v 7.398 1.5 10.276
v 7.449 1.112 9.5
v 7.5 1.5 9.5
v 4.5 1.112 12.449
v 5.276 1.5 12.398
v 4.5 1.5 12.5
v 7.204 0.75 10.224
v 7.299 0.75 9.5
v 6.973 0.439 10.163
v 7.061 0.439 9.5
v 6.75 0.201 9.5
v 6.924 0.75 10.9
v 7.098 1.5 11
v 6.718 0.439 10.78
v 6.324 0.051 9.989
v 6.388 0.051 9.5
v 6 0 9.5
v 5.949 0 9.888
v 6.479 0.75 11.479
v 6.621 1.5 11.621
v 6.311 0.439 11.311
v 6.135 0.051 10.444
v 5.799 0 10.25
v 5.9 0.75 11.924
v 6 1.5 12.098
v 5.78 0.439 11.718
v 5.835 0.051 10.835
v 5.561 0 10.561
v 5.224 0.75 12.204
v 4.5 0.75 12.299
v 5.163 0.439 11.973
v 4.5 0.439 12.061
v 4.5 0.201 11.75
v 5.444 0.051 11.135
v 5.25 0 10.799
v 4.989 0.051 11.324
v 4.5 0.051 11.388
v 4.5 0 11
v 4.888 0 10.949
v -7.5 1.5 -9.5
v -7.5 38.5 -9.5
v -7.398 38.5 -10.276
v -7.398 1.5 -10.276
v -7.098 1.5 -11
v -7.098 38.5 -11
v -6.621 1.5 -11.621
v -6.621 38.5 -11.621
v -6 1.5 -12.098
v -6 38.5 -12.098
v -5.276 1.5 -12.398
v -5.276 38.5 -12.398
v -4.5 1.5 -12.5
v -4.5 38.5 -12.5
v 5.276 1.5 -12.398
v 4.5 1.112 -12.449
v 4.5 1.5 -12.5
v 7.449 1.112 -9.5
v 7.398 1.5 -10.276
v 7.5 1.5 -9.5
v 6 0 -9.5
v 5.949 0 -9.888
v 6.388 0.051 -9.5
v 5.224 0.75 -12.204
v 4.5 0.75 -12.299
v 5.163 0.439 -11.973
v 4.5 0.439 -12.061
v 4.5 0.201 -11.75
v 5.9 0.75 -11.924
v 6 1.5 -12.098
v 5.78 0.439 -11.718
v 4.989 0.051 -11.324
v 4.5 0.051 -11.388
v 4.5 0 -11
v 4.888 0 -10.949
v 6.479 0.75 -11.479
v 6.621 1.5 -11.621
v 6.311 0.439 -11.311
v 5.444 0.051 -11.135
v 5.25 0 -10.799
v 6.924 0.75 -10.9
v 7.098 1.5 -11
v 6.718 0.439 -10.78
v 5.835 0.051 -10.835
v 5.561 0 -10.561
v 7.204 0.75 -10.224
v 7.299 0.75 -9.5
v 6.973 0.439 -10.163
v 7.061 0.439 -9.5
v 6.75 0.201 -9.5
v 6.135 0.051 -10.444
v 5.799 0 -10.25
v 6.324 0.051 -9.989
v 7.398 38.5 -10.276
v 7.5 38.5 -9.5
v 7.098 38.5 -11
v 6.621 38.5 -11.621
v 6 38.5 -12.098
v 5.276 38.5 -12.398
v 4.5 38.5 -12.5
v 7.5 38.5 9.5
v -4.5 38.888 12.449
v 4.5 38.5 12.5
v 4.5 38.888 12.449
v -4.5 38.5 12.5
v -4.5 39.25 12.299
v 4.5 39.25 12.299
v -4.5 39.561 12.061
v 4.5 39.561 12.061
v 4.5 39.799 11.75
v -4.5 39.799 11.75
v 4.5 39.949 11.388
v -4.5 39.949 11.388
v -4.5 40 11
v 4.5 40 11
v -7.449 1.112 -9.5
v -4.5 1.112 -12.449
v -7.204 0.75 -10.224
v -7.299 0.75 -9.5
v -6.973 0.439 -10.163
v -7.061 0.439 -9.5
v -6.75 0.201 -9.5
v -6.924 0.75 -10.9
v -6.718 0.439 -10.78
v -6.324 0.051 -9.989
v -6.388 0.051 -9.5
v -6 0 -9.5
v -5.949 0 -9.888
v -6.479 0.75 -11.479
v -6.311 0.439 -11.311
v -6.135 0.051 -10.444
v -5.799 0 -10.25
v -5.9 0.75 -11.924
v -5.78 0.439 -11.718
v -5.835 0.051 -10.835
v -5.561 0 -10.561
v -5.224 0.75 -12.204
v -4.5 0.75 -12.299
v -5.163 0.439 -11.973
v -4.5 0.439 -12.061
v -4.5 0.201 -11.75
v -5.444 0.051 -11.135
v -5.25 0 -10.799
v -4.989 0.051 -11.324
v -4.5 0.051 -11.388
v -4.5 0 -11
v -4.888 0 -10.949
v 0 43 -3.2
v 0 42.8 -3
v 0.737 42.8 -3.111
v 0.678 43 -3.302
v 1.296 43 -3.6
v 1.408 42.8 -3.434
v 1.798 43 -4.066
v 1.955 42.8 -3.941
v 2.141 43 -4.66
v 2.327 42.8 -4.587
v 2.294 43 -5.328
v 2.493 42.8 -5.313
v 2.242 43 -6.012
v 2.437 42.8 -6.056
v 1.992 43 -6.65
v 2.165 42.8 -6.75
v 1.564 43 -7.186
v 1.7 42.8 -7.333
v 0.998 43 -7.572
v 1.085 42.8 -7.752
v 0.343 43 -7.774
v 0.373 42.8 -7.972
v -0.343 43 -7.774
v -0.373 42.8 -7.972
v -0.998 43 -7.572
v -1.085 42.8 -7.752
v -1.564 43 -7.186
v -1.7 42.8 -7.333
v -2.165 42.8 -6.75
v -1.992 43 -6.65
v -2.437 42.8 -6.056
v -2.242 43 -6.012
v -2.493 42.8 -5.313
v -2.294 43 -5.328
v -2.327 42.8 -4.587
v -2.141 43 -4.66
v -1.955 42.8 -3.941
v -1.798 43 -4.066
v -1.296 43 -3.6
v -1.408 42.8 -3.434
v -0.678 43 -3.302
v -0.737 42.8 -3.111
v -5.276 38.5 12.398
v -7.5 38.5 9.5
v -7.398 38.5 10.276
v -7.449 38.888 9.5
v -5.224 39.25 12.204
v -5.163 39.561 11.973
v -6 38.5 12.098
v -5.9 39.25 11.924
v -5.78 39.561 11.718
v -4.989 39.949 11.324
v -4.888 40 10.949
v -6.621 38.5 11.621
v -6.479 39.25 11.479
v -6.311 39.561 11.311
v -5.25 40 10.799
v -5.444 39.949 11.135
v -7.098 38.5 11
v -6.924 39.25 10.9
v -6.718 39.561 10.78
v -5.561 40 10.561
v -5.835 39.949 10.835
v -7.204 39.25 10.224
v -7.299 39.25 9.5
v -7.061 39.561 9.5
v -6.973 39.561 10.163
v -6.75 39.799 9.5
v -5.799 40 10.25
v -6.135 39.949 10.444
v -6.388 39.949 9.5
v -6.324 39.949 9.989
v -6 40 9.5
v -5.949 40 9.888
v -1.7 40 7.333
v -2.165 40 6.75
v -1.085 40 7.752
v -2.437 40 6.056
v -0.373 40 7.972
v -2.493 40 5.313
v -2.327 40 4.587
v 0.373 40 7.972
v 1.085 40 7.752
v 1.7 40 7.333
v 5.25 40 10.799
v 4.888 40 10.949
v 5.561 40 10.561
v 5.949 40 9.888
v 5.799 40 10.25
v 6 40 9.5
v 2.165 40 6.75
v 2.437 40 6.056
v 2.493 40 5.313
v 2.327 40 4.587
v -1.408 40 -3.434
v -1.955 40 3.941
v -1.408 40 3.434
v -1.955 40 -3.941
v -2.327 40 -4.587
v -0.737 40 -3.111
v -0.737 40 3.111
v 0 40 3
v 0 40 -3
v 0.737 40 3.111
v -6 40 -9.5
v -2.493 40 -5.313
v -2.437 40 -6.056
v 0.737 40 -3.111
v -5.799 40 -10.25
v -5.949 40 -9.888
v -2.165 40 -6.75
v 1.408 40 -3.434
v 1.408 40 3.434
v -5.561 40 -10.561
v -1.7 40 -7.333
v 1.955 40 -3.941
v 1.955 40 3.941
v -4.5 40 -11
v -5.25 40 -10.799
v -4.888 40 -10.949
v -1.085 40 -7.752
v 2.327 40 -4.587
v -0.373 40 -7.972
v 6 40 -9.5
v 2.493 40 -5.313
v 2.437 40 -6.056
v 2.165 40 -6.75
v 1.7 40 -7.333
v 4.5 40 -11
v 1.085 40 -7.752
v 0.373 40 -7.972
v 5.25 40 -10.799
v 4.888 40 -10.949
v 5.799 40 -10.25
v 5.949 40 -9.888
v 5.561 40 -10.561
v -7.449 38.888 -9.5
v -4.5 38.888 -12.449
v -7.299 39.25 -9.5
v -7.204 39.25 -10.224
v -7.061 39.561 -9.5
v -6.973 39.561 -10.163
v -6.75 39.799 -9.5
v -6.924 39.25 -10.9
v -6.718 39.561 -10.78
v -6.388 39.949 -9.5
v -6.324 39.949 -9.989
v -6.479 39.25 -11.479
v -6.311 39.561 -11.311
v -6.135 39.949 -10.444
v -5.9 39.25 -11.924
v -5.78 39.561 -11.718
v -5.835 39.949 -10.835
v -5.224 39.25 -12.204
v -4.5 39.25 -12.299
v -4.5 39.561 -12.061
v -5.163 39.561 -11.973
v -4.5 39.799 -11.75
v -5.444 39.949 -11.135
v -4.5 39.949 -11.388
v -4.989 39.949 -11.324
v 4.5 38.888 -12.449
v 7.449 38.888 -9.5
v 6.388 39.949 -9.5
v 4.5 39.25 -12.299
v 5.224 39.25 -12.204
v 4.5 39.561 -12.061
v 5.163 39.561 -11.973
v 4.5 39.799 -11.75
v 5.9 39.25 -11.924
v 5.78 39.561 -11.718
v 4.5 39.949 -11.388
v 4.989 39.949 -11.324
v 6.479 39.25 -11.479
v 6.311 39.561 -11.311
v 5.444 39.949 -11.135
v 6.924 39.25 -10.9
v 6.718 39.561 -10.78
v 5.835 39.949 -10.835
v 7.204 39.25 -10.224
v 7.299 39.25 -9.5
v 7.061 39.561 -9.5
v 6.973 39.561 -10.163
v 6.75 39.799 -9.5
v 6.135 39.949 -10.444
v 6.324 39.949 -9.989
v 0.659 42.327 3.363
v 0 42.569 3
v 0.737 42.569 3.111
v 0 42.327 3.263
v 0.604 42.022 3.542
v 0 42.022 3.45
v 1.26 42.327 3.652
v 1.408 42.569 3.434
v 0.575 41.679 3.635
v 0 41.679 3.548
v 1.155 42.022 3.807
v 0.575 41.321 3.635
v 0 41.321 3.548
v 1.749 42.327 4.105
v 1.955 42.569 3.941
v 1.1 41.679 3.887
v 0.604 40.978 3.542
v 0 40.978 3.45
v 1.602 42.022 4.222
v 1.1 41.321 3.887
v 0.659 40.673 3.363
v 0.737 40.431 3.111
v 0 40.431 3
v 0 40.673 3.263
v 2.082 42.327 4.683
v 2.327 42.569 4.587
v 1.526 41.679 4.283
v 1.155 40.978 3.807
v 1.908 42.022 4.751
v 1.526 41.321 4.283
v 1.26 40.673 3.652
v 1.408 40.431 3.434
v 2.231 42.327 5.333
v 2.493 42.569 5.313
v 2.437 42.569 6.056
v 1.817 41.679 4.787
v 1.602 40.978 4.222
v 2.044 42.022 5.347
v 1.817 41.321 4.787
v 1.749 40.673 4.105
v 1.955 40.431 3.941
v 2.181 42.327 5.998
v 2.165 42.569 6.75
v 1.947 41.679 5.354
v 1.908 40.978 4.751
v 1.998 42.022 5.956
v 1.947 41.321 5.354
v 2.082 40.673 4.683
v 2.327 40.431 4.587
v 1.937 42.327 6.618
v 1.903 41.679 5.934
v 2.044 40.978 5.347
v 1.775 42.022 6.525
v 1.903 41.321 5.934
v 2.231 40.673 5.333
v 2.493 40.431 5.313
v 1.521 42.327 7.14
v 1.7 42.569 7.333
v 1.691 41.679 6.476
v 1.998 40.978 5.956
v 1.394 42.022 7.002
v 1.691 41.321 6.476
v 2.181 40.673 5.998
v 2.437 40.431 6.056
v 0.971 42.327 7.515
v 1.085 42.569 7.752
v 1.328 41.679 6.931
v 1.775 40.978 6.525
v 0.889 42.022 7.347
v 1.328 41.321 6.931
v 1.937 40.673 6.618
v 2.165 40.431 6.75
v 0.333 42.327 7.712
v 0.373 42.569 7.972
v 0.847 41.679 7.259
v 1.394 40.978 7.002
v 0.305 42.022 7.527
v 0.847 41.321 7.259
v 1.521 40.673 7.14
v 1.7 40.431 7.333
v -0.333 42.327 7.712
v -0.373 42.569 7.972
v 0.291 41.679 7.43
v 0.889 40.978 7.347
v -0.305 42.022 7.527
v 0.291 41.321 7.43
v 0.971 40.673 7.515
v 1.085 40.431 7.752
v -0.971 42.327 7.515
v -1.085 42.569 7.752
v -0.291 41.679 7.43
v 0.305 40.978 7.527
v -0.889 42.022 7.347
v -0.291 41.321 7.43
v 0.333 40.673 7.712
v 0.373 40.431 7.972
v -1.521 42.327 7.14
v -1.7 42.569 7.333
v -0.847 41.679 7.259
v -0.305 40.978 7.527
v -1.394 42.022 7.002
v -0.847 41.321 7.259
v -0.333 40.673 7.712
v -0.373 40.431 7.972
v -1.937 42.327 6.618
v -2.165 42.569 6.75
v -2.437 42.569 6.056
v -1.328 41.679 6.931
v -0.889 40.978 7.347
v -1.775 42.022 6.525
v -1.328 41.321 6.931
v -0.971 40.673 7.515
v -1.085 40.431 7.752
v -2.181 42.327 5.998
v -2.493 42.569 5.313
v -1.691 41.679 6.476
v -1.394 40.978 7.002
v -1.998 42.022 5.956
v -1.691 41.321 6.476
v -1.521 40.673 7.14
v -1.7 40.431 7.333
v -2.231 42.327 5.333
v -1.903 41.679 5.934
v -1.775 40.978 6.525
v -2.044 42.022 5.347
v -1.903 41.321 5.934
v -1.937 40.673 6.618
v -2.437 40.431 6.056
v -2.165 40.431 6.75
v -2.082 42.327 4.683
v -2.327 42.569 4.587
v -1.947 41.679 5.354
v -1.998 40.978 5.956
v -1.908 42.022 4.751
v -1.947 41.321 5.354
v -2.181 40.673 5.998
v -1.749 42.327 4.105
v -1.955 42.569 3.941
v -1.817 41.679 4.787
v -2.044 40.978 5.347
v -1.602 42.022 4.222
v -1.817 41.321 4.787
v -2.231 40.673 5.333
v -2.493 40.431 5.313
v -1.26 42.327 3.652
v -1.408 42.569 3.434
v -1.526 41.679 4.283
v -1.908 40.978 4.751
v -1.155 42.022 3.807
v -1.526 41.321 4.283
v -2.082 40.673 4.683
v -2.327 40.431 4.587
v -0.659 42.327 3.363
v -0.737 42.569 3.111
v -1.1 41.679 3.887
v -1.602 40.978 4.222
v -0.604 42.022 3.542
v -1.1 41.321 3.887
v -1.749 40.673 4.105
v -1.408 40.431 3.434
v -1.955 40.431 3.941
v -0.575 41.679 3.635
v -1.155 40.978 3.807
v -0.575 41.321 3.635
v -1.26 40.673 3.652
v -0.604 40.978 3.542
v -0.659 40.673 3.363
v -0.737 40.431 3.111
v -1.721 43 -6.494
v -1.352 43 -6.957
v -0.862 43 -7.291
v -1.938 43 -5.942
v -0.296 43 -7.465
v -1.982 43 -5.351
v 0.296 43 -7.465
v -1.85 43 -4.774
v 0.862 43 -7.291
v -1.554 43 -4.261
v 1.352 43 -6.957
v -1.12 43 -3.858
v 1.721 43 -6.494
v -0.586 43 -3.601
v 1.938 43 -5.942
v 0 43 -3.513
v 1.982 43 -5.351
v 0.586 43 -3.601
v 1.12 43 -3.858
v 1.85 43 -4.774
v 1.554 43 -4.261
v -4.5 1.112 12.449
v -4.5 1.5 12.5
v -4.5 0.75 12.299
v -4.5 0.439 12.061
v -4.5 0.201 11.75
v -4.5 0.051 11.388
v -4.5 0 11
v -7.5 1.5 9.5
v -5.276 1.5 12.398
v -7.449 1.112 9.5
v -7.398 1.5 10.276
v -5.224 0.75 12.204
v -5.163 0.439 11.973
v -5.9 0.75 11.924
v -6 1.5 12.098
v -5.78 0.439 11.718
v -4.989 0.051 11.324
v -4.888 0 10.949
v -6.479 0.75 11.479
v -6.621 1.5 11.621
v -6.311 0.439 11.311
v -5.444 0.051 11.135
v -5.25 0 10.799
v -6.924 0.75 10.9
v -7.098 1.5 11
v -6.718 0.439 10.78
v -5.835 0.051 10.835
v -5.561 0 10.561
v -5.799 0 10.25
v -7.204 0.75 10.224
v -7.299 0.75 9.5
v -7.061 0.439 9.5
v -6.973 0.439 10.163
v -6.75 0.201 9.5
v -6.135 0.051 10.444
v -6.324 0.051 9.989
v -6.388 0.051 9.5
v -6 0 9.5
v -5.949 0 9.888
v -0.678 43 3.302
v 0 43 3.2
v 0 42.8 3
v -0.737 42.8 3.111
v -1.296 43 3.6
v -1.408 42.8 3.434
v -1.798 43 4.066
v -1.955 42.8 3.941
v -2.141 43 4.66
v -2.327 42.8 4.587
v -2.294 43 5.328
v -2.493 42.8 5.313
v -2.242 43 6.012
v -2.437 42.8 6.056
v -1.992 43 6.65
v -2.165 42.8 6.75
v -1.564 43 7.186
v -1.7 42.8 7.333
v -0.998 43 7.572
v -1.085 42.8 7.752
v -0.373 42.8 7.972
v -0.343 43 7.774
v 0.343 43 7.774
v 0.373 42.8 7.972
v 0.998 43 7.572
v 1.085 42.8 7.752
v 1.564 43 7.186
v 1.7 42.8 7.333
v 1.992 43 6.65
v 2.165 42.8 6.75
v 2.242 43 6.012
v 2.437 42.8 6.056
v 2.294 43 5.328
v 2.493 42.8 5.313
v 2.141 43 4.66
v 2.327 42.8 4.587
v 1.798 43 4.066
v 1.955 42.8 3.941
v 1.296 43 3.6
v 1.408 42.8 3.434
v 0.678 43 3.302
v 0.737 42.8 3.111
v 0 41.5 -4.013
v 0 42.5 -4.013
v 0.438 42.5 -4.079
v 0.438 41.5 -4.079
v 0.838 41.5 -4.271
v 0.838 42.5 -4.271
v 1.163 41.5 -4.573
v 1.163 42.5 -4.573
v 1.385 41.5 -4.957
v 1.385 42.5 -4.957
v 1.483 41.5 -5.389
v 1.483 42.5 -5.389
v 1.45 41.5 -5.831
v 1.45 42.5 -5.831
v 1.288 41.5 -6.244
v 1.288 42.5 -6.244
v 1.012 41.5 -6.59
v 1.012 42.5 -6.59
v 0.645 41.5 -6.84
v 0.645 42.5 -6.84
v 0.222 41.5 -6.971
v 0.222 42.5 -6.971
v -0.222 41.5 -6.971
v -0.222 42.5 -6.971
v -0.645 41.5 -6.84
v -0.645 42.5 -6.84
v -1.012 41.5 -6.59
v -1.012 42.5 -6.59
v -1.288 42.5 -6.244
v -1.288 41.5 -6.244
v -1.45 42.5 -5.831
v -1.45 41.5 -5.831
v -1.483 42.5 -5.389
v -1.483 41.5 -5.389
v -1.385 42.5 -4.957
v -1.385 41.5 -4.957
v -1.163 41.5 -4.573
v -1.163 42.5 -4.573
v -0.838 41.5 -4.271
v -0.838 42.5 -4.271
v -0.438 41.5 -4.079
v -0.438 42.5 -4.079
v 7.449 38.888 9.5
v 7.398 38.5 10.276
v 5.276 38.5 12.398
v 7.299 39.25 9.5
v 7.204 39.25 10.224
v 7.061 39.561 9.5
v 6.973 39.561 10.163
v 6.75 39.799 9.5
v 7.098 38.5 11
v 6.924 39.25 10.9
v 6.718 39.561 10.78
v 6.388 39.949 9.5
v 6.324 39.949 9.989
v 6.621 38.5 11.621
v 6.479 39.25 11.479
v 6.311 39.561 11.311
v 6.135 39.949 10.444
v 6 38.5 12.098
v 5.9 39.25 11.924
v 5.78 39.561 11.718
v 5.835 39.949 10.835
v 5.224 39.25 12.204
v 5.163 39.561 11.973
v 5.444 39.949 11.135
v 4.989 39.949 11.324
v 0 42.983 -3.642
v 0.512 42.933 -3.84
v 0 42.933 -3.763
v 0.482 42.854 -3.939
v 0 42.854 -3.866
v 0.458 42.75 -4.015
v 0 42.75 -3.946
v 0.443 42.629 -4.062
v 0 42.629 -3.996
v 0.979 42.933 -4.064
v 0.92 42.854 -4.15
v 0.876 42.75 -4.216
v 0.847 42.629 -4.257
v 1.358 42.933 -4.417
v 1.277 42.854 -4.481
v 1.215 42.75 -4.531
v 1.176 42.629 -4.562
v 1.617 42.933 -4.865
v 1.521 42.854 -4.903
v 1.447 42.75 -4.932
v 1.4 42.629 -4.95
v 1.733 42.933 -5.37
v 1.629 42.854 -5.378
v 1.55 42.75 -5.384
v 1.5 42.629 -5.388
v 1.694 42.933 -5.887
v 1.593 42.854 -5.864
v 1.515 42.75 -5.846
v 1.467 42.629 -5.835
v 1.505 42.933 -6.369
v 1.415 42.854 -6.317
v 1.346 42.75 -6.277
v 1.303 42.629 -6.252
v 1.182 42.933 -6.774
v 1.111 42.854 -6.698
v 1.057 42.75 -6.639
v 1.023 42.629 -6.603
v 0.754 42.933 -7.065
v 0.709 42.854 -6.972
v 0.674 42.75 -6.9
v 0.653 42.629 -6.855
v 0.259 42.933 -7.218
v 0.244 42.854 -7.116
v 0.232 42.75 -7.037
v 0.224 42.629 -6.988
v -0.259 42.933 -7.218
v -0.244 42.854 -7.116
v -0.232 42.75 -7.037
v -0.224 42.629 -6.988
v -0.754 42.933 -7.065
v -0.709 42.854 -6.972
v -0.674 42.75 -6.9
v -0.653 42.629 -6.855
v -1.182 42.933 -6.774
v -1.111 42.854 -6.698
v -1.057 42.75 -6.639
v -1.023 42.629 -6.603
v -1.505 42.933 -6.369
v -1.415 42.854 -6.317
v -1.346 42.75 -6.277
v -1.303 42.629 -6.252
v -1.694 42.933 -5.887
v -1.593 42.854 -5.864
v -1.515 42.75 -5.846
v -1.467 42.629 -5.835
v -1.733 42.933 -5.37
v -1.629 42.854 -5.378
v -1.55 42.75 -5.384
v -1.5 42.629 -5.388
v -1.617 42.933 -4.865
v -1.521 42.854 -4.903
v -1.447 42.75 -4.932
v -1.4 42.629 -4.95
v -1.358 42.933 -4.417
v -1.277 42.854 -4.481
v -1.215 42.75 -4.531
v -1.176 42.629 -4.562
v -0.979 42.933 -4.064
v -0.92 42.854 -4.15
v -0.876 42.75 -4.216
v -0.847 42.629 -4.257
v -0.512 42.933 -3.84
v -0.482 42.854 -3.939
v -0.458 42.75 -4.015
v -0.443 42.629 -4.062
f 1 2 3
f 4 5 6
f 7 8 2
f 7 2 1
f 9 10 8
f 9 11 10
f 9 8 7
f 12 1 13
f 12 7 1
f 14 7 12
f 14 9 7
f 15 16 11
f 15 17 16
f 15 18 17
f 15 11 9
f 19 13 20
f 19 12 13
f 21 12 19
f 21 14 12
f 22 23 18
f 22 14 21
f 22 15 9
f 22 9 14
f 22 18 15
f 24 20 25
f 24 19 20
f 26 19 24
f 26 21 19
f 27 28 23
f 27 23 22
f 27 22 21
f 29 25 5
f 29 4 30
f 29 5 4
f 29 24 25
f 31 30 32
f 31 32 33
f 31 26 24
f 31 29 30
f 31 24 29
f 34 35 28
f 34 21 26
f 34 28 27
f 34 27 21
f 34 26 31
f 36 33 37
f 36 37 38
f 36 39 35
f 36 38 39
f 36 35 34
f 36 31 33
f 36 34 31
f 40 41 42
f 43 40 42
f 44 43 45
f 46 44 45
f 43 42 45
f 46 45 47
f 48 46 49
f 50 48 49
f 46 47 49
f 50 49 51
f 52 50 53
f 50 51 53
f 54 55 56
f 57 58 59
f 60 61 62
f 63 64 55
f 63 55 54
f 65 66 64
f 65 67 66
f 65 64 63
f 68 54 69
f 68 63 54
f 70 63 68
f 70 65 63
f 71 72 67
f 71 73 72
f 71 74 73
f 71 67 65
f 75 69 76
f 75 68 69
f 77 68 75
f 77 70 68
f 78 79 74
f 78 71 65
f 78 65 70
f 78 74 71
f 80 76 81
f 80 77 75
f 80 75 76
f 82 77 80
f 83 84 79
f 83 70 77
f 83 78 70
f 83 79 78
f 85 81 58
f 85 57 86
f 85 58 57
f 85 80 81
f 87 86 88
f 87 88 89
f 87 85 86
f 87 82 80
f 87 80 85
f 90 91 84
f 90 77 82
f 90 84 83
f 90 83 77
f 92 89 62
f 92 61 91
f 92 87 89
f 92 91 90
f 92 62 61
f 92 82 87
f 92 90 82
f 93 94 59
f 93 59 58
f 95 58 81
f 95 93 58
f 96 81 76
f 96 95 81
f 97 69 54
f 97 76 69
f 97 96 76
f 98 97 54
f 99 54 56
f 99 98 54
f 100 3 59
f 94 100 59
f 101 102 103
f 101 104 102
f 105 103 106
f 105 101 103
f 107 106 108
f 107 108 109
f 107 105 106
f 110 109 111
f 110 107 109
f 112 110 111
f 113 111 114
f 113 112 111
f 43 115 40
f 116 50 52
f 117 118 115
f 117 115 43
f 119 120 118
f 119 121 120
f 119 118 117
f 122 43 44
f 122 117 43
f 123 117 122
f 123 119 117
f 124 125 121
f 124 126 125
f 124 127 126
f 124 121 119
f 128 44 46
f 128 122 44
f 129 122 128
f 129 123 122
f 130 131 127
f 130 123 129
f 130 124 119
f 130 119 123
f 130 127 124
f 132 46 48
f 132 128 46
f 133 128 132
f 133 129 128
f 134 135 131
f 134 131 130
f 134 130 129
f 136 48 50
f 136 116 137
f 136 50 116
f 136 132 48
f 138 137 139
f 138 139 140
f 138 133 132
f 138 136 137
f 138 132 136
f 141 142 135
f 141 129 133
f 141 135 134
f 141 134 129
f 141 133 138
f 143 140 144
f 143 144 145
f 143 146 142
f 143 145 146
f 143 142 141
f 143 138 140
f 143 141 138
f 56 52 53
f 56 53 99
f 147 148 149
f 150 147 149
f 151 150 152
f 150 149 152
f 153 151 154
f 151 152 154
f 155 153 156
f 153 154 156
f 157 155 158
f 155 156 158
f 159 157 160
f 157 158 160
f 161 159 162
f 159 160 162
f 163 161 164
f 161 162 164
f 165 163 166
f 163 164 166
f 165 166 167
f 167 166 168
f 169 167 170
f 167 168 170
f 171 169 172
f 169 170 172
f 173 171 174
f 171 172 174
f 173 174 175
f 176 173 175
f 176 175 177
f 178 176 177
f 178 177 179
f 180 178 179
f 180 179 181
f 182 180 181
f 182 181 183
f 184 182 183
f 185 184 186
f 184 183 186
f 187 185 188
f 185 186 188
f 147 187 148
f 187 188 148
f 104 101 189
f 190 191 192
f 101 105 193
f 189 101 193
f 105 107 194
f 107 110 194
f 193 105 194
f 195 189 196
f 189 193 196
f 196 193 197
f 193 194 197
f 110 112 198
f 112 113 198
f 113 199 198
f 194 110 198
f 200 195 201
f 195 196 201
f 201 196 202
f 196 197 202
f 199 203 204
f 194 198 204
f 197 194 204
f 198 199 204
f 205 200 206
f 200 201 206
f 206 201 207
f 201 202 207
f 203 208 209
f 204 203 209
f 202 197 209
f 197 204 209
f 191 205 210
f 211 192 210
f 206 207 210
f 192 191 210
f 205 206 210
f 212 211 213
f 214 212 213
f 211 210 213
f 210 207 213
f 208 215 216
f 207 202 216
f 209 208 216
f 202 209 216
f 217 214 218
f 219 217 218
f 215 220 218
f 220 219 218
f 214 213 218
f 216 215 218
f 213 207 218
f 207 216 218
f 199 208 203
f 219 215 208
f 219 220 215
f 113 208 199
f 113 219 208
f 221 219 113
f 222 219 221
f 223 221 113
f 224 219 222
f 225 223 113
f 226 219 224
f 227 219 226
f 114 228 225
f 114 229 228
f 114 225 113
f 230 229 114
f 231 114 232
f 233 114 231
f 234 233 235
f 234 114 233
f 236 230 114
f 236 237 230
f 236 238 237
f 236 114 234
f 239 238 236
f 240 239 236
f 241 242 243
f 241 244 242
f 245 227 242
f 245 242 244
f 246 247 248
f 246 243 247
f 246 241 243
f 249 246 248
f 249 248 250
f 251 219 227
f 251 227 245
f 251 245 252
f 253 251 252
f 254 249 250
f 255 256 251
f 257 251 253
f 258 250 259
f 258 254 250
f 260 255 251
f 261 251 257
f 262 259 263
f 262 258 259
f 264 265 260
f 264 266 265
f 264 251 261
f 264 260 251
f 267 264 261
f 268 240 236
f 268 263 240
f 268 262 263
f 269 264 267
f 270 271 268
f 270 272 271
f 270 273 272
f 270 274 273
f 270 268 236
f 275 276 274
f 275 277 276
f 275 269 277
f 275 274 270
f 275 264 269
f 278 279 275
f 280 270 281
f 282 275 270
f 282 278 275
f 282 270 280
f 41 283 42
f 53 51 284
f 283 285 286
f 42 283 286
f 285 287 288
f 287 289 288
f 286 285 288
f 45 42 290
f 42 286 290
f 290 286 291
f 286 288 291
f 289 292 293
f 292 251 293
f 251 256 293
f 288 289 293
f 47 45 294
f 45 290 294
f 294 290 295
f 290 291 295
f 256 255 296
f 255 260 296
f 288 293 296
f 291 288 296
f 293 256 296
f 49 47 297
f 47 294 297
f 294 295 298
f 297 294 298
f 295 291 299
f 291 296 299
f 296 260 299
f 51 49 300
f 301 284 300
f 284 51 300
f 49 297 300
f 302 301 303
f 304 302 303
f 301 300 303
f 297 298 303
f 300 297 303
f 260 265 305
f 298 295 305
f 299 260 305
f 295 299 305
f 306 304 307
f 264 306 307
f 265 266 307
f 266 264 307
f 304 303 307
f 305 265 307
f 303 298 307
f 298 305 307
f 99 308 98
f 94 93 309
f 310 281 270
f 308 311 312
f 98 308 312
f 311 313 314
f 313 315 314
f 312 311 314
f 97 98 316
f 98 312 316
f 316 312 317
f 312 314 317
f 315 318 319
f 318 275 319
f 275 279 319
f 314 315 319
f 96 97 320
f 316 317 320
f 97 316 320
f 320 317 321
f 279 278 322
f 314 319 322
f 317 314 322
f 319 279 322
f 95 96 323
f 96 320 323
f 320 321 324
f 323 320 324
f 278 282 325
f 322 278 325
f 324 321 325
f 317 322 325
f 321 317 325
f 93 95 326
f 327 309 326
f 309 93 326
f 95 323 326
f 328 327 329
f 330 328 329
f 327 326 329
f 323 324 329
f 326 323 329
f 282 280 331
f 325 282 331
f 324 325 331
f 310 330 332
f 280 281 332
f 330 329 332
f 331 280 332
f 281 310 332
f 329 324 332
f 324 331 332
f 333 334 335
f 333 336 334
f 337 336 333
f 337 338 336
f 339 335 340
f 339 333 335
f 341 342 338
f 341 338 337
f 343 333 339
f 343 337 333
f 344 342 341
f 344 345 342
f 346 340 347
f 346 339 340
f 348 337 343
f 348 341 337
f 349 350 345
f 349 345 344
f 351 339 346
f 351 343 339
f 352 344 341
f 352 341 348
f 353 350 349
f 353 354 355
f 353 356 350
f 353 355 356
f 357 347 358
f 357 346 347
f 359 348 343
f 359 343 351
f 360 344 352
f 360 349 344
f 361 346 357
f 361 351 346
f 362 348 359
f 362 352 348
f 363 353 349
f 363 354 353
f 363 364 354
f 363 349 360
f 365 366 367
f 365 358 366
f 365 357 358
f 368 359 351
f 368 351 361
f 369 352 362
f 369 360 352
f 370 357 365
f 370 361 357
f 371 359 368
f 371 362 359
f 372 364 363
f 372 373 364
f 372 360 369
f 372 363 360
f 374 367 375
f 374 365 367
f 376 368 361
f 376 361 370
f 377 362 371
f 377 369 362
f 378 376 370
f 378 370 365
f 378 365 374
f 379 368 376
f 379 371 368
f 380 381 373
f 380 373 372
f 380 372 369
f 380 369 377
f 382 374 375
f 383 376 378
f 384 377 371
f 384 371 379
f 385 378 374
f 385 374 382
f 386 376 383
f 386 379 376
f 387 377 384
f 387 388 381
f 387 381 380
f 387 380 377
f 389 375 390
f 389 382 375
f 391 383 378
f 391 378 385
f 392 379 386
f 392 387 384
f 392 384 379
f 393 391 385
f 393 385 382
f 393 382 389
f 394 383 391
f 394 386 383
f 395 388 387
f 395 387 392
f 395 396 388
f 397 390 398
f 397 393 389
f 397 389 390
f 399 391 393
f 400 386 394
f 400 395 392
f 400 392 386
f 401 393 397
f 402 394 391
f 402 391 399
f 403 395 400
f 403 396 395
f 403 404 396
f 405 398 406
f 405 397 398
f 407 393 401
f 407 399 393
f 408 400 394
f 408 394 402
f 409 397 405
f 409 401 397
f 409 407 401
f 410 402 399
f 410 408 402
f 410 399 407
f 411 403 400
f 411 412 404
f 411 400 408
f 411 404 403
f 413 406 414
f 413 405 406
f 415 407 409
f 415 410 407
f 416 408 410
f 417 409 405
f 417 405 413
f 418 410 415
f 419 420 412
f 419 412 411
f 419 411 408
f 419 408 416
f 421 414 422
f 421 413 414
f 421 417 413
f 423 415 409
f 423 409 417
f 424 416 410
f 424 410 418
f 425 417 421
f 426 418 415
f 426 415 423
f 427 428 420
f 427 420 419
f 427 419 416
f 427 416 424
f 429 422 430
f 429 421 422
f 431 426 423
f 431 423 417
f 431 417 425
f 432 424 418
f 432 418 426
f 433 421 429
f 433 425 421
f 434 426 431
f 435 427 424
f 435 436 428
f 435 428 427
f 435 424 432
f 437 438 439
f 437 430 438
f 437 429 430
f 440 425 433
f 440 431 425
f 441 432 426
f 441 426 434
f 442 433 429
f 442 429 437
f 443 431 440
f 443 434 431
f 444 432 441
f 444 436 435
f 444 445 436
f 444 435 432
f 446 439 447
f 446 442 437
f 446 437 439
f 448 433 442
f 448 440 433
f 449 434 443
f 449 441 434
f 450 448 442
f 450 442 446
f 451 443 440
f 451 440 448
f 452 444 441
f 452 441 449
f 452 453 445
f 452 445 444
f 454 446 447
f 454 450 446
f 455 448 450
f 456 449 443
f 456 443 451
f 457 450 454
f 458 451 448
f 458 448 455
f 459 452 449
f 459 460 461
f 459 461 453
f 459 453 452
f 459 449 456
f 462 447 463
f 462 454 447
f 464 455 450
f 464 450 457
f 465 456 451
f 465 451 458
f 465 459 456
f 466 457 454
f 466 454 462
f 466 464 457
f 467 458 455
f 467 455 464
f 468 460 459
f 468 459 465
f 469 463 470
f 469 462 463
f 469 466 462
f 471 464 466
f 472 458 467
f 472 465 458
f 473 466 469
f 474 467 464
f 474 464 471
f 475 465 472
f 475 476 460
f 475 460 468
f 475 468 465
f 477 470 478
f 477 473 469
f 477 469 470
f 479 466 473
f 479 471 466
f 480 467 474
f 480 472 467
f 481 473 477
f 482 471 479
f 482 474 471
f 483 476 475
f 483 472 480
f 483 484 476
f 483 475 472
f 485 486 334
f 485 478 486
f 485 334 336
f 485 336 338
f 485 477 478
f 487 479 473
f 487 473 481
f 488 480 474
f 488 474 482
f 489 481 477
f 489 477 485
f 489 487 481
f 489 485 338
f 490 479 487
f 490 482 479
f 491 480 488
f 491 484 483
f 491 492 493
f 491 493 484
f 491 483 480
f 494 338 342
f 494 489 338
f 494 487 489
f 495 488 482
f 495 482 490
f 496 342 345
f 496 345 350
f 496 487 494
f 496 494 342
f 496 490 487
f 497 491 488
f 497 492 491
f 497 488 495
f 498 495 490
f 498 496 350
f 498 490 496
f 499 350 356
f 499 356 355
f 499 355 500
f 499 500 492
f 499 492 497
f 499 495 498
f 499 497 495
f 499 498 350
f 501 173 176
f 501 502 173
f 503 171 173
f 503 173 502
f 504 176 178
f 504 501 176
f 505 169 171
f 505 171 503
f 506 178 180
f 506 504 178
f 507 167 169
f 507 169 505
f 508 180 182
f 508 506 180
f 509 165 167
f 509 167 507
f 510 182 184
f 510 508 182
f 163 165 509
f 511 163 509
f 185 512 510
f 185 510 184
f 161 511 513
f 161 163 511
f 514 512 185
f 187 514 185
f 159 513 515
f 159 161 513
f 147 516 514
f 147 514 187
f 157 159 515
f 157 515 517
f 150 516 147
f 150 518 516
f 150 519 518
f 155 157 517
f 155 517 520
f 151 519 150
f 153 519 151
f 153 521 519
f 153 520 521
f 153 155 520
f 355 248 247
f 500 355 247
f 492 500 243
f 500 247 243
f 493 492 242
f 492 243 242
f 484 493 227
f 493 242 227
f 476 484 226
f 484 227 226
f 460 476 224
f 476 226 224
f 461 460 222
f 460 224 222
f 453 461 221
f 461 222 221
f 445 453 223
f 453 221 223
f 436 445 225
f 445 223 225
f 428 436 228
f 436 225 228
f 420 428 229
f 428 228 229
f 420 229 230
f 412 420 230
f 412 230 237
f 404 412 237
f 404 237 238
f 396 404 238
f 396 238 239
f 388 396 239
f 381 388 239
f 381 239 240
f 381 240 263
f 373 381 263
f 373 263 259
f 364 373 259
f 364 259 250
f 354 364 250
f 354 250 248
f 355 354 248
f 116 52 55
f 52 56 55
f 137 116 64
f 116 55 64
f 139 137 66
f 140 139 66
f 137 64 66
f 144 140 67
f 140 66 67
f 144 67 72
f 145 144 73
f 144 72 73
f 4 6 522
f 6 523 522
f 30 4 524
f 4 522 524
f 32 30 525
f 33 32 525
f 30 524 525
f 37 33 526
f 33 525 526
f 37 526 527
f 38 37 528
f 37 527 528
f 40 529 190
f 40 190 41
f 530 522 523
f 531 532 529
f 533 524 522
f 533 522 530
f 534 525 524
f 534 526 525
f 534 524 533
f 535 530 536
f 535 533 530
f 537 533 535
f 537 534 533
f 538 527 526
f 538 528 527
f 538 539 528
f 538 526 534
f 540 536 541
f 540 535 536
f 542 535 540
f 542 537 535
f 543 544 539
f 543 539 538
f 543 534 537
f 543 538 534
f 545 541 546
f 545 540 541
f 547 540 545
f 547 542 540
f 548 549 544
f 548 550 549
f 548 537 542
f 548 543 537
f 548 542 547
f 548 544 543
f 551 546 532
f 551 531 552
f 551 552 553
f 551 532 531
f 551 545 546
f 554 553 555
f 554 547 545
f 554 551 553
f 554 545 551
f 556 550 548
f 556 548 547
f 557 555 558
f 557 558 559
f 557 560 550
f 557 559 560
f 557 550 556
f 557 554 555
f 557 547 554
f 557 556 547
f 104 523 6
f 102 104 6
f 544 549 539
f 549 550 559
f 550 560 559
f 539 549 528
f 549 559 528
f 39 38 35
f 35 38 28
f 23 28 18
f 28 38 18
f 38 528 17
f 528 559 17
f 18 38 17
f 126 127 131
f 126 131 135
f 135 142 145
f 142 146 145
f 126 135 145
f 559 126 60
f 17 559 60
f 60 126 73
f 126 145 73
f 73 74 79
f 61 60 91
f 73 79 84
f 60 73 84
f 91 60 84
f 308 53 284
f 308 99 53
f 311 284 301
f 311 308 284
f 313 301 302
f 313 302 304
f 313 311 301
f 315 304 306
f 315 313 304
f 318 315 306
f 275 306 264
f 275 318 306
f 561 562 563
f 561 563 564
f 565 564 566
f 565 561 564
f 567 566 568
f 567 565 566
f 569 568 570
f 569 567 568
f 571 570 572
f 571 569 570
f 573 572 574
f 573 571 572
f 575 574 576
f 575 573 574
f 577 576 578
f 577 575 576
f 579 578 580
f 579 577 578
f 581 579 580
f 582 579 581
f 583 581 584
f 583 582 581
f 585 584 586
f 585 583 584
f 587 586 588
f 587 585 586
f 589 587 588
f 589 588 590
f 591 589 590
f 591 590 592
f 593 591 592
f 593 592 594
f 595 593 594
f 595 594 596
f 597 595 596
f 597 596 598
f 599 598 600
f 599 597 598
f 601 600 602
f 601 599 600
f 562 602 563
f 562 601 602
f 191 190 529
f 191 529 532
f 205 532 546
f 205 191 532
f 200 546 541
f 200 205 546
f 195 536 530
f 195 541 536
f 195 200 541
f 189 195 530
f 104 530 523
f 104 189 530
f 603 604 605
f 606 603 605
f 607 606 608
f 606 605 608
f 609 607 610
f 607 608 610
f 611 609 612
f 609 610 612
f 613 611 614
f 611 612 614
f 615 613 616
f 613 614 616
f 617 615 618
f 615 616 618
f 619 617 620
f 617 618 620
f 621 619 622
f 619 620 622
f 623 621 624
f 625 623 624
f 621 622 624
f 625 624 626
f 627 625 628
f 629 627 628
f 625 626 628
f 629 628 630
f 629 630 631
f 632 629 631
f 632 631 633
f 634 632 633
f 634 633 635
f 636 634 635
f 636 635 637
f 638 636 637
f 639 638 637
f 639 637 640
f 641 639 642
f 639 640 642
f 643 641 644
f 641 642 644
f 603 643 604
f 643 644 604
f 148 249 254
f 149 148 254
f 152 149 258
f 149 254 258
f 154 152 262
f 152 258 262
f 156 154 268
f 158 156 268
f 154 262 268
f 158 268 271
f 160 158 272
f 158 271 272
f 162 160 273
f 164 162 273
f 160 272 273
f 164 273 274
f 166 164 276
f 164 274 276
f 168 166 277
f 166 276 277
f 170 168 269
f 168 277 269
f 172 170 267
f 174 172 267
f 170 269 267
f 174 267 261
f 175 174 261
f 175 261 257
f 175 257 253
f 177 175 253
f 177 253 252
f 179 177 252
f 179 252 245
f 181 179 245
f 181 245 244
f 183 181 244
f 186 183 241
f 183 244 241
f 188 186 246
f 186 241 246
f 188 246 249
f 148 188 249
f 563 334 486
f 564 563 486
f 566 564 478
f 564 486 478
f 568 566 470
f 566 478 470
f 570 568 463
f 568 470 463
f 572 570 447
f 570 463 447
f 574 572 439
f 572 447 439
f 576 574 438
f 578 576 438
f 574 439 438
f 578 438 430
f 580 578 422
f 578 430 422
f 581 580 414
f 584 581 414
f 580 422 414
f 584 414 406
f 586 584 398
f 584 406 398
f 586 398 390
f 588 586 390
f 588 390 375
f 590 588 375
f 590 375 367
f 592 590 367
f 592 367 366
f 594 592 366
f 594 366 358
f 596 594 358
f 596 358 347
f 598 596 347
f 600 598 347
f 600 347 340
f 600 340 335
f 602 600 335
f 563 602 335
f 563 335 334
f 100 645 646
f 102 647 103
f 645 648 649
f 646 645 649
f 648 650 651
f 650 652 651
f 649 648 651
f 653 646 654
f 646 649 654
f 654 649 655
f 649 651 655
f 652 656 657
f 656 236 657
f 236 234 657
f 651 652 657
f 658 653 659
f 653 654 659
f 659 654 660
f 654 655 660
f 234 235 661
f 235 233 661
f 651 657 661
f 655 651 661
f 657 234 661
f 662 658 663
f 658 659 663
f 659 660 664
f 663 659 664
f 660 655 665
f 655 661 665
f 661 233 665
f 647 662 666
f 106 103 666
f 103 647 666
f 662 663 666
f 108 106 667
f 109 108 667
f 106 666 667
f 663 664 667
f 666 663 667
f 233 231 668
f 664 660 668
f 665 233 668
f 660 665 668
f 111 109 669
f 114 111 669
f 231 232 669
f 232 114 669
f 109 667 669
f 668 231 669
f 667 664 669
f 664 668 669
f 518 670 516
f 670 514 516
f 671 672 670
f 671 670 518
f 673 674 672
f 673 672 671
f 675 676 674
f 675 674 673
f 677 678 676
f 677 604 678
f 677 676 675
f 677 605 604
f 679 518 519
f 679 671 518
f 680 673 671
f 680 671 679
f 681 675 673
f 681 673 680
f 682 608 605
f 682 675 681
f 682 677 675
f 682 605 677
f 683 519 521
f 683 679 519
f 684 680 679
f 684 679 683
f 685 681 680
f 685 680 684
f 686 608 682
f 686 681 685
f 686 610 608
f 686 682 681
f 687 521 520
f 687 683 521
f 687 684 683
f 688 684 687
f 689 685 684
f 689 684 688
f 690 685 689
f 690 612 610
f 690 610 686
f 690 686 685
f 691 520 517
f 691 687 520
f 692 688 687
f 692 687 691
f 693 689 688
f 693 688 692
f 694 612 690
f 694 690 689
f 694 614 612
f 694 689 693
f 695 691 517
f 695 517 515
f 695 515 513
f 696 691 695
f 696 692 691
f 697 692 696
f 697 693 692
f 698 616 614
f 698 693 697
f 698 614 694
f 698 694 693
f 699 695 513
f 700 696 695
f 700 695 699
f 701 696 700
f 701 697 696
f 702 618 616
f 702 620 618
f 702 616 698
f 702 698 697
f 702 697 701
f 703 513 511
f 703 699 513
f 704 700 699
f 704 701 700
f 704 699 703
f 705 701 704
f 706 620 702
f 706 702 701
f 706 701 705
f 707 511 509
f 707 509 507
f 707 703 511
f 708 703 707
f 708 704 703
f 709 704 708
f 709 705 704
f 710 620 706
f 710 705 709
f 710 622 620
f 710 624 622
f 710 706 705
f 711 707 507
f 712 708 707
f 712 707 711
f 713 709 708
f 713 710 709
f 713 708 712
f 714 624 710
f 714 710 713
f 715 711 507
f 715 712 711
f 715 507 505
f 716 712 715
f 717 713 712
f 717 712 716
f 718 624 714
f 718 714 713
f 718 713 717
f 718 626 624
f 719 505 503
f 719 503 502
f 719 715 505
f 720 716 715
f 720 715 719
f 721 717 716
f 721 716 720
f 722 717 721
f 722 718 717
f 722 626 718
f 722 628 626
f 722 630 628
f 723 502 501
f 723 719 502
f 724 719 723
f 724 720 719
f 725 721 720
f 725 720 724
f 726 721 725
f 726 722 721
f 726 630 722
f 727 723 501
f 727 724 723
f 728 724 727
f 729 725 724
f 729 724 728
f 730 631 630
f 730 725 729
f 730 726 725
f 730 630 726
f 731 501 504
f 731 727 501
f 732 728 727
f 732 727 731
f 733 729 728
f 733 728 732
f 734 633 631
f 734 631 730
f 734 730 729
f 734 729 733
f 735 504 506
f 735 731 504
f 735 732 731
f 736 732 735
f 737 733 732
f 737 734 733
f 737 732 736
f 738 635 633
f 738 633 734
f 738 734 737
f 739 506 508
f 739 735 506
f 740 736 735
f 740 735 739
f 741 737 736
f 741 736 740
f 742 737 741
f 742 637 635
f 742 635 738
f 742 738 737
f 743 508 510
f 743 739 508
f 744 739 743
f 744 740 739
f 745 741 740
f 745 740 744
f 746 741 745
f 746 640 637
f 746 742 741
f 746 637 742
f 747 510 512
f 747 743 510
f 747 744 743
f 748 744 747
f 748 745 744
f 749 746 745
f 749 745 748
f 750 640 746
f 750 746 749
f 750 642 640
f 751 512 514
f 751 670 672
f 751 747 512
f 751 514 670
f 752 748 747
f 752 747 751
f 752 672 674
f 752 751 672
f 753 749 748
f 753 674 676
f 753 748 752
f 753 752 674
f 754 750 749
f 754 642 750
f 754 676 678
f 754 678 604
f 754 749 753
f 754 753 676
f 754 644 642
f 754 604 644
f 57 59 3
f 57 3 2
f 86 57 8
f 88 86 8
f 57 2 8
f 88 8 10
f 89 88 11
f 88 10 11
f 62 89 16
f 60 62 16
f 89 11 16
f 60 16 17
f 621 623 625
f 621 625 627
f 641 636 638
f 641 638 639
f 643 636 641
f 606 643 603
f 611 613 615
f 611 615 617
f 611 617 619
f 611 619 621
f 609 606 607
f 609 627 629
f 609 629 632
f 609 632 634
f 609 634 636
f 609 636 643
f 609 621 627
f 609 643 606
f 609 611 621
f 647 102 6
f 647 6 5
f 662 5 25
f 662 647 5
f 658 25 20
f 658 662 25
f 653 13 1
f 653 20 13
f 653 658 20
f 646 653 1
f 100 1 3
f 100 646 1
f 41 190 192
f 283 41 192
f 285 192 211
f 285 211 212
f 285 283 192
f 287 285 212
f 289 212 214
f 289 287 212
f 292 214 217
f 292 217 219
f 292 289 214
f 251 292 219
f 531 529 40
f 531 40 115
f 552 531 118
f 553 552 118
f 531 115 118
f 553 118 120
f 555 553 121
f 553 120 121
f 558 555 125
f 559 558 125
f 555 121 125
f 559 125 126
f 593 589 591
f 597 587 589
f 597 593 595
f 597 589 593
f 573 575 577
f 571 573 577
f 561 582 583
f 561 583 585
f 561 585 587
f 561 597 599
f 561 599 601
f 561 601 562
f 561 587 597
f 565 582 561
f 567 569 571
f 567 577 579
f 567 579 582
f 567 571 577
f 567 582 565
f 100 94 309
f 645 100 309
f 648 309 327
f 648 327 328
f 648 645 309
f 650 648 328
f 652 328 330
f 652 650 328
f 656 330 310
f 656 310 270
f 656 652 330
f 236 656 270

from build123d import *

# Parameters (mm, degrees)
CROQUIS1_W              = 15
CROQUIS1_H              = 25
SALIENTE_EXTRUIR1_DEPTH = 40
REDONDEO1_R             = 3
REDONDEO2_R             = 1.5
REDONDEO3_R             = 1.5
CROQUIS2_R              = 2.5
SALIENTE_EXTRUIR2_DEPTH = 3
CROQUIS3_R              = 1.487403204
CORTAR_EXTRUIR1_DEPTH   = 1.5
REDONDEO4_R             = 0.5
CHAFL_N1_SIZE           = 0.2
CROQUIS4_R              = 1.299235838
CHAFL_N2_SIZE           = 0.2


with BuildPart() as part:
    # Croquis1 → Saliente-Extruir1 (new body)
    with BuildSketch(Plane(origin=(0, 0, 0), x_dir=(1, 0, 0), z_dir=(0, 1, 0))):
        Rectangle(CROQUIS1_W, CROQUIS1_H)
    extrude(amount=SALIENTE_EXTRUIR1_DEPTH)

    # Redondeo1
    redondeo1_edges = [part.edges().sort_by_distance(p)[0] for p in [
        (7.5, 20, 12.5),
        (-7.5, 20, 12.5),
        (-7.5, 20, -12.5),
        (7.5, 20, -12.5),
    ]]
    fillet(redondeo1_edges, radius=REDONDEO1_R)

    # Redondeo2
    redondeo2_edges = [part.edges().sort_by_distance(p)[0] for p in [
        (-7.5, 0, 0),
        (7.5, 0, 0),
        (0, 0, 12.5),
        (0, 0, -12.5),
        (6.621320344, 0, 11.621320344),
        (-6.621320344, 0, 11.621320344),
        (6.621320344, 0, -11.621320344),
        (-6.621320344, 0, -11.621320344),
    ]]
    fillet(redondeo2_edges, radius=REDONDEO2_R)

    # Redondeo3
    redondeo3_edges = [part.edges().sort_by_distance(p)[0] for p in [
        (-7.5, 40, 0),
        (0, 40, -12.5),
        (7.5, 40, 0),
        (0, 40, 12.5),
        (6.621320344, 40, 11.621320344),
        (-6.621320344, 40, 11.621320344),
        (6.621320344, 40, -11.621320344),
        (-6.621320344, 40, -11.621320344),
    ]]
    fillet(redondeo3_edges, radius=REDONDEO3_R)

    # Croquis2 → Saliente-Extruir2 (add)
    with BuildSketch(Plane(origin=(0, 40, 0), x_dir=(1, 0, 0), z_dir=(0, 1, 0))):
        with Locations(Location((0, 5.5, 0), (0, 0, 270))):
            Circle(CROQUIS2_R)
        with Locations(Location((0, -5.5, 0), (0, 0, 90))):
            Circle(CROQUIS2_R)
    extrude(amount=SALIENTE_EXTRUIR2_DEPTH)

    # Croquis3 → Cortar-Extruir1 (cut)
    with BuildSketch(Plane(origin=(0, 43, 0), x_dir=(1, 0, 0), z_dir=(0, 1, 0))):
        with Locations(Location((0, 5.5, 0), (0, 0, 270))):
            Circle(CROQUIS3_R)
    extrude(amount=-CORTAR_EXTRUIR1_DEPTH, mode=Mode.SUBTRACT)

    # Redondeo4
    redondeo4_edges = [part.edges().sort_by_distance(p)[0] for p in [
        (0, 43, -6.987403204),
    ]]
    fillet(redondeo4_edges, radius=REDONDEO4_R)

    # Chaflán1
    chafl_n1_edges = [part.edges().sort_by_distance(p)[0] for p in [
        (0, 43, -8),
    ]]
    chamfer(chafl_n1_edges, length=CHAFL_N1_SIZE)

    # Croquis4 → Cortar-Revolución1 (revolve, cut)
    with BuildSketch(Plane(origin=(0, 0, 0), x_dir=(0, 0, -1), z_dir=(1, 0, 0))):
        with Locations((-2.260920396, 41.5)):
            Circle(CROQUIS4_R)
    revolve(axis=Axis((0, 43, 5.5), (0, -1, 0)), mode=Mode.SUBTRACT)

    # Chaflán2
    chafl_n2_edges = [part.edges().sort_by_distance(p)[0] for p in [
        (0, 43, 8),
    ]]
    chamfer(chafl_n2_edges, length=CHAFL_N2_SIZE)


solid = part.part
